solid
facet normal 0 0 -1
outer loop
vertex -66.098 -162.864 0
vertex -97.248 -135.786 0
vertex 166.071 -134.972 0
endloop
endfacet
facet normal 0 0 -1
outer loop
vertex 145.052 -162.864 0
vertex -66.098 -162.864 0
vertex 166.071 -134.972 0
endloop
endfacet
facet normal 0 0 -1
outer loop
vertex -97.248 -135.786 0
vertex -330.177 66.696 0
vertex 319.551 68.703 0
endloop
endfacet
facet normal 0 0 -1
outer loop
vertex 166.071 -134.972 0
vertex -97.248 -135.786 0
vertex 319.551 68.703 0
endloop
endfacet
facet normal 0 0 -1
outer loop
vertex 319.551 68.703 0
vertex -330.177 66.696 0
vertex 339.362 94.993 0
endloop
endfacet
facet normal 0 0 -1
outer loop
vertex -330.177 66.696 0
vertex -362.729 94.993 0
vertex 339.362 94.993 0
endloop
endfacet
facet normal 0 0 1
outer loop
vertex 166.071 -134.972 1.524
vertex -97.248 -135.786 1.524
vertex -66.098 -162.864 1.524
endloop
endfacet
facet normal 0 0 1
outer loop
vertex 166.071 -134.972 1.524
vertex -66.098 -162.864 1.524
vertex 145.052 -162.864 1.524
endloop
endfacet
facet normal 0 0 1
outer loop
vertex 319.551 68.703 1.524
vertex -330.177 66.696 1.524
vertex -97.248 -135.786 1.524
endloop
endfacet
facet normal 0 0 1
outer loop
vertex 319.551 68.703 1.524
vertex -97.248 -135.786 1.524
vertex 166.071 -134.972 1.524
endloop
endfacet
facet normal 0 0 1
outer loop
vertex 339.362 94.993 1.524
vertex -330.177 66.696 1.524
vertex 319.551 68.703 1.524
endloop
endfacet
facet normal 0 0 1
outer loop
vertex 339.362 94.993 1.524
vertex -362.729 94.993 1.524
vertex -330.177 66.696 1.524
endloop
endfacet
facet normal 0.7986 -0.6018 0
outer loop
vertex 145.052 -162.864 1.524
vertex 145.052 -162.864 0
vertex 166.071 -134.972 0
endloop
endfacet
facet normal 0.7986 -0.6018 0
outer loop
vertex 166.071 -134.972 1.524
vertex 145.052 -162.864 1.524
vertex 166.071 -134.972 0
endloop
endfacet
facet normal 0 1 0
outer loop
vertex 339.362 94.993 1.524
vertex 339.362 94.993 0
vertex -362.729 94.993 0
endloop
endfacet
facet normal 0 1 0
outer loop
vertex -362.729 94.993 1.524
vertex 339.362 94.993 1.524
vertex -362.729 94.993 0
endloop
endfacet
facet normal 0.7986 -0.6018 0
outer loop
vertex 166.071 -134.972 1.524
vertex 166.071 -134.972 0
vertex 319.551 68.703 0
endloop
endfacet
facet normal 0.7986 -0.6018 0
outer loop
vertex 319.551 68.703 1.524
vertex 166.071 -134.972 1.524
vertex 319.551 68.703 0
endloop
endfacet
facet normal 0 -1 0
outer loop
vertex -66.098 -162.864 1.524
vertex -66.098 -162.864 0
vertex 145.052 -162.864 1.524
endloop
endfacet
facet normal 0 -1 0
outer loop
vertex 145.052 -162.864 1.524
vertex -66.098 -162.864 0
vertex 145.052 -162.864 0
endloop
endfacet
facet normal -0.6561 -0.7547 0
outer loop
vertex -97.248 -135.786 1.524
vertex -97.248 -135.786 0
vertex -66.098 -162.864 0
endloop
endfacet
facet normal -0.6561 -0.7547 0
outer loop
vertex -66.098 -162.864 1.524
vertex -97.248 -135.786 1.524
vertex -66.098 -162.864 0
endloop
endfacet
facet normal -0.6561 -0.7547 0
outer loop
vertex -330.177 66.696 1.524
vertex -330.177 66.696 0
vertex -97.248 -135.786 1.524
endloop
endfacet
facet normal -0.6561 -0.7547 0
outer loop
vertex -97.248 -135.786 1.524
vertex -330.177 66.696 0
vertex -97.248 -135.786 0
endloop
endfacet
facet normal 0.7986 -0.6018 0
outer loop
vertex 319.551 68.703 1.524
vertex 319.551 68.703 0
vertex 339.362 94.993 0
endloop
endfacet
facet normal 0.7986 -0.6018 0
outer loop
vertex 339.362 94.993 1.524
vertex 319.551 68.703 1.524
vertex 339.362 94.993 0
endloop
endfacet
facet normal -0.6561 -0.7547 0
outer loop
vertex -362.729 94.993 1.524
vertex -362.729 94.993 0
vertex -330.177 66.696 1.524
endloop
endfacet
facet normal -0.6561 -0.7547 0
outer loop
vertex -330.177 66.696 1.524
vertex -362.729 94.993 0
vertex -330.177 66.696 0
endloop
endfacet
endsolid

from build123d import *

# Parameters (mm, degrees)
F1_DEPTH = 1.524


with BuildPart() as f1:
    # F0 (on Top) → F1 (new body)
    with BuildSketch(Plane.XY):
        Polygon((-97.248423, -135.78557), (-66.097785, -162.864407), (145.052415, -162.864407), (166.070805, -134.972061), align=None)
        Polygon((-330.176573, 66.695782), (-97.248423, -135.78557), (166.070805, -134.972061), (319.55103, 68.703076), align=None)
        Polygon((-362.728536, 94.992772), (-330.176573, 66.695782), (319.55103, 68.703076), (339.361736, 94.992772), align=None)
    extrude(amount=F1_DEPTH)


solid = f1.part
